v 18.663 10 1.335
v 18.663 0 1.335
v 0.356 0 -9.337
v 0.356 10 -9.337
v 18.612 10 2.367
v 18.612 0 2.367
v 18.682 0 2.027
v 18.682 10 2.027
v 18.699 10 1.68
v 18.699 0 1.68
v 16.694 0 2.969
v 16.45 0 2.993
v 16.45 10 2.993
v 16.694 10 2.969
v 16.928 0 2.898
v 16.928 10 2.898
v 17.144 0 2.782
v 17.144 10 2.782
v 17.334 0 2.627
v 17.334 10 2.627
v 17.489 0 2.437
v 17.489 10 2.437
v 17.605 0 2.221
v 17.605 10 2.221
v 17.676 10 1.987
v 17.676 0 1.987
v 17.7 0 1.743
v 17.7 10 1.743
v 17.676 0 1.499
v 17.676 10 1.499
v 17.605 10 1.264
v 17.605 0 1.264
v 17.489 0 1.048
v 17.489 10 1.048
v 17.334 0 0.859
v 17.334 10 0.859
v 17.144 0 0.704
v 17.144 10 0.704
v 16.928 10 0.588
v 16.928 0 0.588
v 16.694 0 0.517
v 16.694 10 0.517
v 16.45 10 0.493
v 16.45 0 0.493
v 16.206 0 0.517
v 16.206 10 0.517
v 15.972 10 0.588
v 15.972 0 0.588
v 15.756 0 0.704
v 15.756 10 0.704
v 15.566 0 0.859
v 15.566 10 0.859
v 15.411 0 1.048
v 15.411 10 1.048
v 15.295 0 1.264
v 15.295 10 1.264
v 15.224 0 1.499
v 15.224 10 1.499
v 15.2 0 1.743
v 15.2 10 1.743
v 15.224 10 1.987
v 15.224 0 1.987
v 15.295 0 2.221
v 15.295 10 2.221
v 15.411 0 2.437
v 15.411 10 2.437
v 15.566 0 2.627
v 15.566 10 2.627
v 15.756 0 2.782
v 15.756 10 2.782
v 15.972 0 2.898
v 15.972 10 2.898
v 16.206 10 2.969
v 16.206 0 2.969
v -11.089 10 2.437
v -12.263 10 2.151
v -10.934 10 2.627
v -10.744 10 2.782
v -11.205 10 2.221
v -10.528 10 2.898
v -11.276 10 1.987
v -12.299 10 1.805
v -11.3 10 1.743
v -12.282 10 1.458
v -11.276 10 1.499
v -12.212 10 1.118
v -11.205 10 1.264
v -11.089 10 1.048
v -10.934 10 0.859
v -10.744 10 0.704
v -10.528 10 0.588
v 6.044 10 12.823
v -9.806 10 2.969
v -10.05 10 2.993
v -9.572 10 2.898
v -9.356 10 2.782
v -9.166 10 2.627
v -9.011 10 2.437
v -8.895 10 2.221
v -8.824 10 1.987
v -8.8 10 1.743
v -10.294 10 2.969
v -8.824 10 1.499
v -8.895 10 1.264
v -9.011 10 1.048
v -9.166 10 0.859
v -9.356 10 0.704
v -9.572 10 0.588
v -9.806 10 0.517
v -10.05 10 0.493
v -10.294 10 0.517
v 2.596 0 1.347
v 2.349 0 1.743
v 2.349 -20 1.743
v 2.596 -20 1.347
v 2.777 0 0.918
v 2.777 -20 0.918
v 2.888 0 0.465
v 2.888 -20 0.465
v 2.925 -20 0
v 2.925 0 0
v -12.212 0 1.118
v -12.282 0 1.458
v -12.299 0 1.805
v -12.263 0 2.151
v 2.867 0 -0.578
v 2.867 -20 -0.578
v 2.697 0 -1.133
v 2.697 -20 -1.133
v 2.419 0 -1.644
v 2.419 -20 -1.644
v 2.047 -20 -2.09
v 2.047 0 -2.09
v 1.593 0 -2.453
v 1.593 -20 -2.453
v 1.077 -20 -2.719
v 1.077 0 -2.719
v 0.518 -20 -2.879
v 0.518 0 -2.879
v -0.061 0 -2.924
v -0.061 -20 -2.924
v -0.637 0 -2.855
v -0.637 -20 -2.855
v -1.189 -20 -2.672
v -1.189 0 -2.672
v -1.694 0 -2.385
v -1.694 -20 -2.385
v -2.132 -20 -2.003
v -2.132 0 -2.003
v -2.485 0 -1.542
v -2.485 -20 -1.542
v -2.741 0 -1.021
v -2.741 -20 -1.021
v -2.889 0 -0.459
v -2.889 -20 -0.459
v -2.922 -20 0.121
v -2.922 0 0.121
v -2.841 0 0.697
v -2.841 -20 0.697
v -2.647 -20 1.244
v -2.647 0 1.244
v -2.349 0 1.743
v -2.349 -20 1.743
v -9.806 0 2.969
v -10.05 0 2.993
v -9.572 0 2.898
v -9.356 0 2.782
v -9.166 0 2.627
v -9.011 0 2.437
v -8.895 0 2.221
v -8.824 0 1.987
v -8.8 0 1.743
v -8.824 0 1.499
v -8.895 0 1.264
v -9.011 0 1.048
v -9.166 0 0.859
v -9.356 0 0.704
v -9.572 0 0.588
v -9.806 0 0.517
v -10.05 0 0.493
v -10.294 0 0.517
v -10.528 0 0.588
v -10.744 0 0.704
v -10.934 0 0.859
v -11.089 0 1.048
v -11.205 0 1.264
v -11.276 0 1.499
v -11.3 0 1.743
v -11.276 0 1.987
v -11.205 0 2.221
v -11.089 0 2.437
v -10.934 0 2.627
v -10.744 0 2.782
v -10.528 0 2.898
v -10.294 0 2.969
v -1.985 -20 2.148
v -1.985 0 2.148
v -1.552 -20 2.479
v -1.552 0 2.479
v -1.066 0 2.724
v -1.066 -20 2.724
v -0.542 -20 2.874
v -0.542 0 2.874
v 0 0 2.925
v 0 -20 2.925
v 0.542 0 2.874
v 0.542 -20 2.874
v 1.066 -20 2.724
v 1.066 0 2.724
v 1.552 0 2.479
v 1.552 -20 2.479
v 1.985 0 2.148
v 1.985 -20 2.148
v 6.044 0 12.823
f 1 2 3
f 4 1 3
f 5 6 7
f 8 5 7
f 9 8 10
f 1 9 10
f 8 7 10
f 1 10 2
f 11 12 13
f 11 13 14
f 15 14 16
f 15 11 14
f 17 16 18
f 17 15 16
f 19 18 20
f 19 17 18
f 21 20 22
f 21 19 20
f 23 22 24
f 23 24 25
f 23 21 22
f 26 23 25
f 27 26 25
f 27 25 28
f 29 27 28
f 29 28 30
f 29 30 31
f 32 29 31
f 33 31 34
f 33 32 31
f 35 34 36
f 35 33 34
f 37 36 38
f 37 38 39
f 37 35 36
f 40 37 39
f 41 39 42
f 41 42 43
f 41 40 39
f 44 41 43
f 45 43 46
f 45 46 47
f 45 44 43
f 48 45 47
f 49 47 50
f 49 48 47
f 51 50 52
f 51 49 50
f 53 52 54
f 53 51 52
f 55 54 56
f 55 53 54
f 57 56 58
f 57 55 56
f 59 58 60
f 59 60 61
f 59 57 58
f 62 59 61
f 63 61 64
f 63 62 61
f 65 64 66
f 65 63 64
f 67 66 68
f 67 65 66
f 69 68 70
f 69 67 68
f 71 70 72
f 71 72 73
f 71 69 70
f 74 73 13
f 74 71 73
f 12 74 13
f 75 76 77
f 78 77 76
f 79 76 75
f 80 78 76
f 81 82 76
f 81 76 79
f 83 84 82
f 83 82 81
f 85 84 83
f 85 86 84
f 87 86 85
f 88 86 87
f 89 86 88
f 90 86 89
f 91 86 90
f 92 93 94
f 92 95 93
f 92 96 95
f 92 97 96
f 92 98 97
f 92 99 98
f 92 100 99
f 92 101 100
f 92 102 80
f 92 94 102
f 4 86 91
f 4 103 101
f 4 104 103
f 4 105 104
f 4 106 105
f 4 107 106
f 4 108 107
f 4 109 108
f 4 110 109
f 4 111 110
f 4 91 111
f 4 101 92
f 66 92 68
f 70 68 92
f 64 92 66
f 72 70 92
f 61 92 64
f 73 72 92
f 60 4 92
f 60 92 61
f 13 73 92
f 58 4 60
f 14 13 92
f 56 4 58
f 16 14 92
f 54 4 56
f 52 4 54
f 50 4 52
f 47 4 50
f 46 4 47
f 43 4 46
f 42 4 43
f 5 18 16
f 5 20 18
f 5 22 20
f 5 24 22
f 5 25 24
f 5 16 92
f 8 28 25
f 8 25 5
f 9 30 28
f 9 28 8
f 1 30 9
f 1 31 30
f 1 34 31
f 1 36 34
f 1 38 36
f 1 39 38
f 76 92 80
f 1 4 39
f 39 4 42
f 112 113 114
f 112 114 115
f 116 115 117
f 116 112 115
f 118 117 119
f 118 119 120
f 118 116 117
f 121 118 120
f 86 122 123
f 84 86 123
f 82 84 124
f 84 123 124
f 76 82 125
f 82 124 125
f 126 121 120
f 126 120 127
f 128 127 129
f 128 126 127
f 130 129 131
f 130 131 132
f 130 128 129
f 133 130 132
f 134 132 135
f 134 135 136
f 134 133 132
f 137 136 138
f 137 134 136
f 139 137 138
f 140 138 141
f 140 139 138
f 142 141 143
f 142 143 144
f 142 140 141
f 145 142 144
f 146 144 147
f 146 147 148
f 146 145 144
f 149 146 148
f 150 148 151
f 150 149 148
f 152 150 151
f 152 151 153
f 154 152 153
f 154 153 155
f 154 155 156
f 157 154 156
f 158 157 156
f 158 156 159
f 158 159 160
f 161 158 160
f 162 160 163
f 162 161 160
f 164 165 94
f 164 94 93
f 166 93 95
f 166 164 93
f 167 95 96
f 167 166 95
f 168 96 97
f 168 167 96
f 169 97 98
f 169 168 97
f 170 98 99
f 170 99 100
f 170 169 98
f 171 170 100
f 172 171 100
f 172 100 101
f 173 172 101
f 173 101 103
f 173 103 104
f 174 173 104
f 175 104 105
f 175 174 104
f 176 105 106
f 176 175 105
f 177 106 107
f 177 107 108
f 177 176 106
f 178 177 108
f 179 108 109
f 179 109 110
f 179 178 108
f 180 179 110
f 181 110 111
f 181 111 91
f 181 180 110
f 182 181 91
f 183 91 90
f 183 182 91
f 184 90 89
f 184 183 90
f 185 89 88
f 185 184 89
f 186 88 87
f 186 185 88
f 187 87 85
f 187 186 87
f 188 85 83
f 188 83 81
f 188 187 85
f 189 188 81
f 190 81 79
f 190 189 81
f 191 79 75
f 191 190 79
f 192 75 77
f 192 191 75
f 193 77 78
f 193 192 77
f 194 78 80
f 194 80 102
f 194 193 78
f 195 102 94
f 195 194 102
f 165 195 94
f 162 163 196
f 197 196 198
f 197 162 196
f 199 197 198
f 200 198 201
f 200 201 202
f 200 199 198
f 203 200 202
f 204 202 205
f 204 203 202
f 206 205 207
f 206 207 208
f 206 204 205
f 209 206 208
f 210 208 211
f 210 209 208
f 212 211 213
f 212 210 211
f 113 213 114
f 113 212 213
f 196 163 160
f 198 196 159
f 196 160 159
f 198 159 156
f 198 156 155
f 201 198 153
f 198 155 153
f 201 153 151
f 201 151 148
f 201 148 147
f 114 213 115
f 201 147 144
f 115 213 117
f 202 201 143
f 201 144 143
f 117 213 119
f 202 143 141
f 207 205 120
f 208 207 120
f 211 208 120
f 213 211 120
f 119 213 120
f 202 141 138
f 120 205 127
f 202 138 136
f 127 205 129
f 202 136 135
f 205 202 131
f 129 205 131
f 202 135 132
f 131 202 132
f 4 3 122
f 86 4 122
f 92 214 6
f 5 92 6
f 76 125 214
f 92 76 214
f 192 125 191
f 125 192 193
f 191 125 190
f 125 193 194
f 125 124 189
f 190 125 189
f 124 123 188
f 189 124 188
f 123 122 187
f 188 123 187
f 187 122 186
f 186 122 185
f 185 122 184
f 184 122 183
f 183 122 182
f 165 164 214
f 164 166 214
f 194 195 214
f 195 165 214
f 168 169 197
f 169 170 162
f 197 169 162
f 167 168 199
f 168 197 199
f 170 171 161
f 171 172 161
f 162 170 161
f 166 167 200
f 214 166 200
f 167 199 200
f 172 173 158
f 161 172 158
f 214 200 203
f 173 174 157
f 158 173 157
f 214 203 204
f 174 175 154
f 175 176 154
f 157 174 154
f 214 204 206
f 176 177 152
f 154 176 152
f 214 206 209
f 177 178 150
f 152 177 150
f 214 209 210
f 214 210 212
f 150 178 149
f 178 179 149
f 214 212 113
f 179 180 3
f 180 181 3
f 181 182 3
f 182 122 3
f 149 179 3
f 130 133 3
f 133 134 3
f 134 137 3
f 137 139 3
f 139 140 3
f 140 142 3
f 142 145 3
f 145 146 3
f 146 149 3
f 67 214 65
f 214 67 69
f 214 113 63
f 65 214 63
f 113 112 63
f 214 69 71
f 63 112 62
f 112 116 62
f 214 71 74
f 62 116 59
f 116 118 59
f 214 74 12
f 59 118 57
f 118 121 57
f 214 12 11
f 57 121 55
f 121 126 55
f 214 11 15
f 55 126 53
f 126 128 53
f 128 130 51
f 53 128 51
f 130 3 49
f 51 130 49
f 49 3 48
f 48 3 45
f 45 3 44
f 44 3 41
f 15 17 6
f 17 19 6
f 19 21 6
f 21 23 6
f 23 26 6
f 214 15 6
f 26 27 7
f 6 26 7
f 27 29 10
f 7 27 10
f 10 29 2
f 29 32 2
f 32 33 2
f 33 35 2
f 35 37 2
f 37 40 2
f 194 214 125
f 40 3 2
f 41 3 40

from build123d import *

# Parameters (mm, degrees)
SKETCH1_R           = 1.25
BOSS_EXTRUDE1_DEPTH = 10
SKETCH1_3_R         = 2.925
BOSS_EXTRUDE2_DEPTH = 20


with BuildPart() as part:
    # Sketch1 → Boss-Extrude1 (new body)
    with BuildSketch(Plane(origin=(0, 0, 0), x_dir=(1, 0, 0), z_dir=(0, 1, 0))):
        with BuildLine():
            Line((0.356274676, 9.337394122), (-12.211586722, -1.118308403))
            ThreePointArc((-12.211586722, -1.118308403), (-12.29724406, -1.631513563), (-12.262730232, -2.150672028))
            Line((-12.262730232, -2.150672028), (6.043725324, -12.823079133))
            Line((6.043725324, -12.823079133), (18.611586722, -2.367376608))
            ThreePointArc((18.611586722, -2.367376608), (18.69724406, -1.854171449), (18.662730232, -1.335012984))
            Line((18.662730232, -1.335012984), (0.356274676, 9.337394122))
        make_face()
        with Locations((-10.05, -1.742842506)):
            Circle(SKETCH1_R, mode=Mode.SUBTRACT)
        with Locations((16.45, -1.742842506)):
            Circle(SKETCH1_R, mode=Mode.SUBTRACT)
    extrude(amount=BOSS_EXTRUDE1_DEPTH)

    # Sketch1<3> → Boss-Extrude2 (add)
    with BuildSketch(Plane(origin=(0, 0, 0), x_dir=(1, 0, 0), z_dir=(0, 1, 0))):
        Circle(SKETCH1_3_R)
    extrude(amount=-BOSS_EXTRUDE2_DEPTH)


solid = part.part
